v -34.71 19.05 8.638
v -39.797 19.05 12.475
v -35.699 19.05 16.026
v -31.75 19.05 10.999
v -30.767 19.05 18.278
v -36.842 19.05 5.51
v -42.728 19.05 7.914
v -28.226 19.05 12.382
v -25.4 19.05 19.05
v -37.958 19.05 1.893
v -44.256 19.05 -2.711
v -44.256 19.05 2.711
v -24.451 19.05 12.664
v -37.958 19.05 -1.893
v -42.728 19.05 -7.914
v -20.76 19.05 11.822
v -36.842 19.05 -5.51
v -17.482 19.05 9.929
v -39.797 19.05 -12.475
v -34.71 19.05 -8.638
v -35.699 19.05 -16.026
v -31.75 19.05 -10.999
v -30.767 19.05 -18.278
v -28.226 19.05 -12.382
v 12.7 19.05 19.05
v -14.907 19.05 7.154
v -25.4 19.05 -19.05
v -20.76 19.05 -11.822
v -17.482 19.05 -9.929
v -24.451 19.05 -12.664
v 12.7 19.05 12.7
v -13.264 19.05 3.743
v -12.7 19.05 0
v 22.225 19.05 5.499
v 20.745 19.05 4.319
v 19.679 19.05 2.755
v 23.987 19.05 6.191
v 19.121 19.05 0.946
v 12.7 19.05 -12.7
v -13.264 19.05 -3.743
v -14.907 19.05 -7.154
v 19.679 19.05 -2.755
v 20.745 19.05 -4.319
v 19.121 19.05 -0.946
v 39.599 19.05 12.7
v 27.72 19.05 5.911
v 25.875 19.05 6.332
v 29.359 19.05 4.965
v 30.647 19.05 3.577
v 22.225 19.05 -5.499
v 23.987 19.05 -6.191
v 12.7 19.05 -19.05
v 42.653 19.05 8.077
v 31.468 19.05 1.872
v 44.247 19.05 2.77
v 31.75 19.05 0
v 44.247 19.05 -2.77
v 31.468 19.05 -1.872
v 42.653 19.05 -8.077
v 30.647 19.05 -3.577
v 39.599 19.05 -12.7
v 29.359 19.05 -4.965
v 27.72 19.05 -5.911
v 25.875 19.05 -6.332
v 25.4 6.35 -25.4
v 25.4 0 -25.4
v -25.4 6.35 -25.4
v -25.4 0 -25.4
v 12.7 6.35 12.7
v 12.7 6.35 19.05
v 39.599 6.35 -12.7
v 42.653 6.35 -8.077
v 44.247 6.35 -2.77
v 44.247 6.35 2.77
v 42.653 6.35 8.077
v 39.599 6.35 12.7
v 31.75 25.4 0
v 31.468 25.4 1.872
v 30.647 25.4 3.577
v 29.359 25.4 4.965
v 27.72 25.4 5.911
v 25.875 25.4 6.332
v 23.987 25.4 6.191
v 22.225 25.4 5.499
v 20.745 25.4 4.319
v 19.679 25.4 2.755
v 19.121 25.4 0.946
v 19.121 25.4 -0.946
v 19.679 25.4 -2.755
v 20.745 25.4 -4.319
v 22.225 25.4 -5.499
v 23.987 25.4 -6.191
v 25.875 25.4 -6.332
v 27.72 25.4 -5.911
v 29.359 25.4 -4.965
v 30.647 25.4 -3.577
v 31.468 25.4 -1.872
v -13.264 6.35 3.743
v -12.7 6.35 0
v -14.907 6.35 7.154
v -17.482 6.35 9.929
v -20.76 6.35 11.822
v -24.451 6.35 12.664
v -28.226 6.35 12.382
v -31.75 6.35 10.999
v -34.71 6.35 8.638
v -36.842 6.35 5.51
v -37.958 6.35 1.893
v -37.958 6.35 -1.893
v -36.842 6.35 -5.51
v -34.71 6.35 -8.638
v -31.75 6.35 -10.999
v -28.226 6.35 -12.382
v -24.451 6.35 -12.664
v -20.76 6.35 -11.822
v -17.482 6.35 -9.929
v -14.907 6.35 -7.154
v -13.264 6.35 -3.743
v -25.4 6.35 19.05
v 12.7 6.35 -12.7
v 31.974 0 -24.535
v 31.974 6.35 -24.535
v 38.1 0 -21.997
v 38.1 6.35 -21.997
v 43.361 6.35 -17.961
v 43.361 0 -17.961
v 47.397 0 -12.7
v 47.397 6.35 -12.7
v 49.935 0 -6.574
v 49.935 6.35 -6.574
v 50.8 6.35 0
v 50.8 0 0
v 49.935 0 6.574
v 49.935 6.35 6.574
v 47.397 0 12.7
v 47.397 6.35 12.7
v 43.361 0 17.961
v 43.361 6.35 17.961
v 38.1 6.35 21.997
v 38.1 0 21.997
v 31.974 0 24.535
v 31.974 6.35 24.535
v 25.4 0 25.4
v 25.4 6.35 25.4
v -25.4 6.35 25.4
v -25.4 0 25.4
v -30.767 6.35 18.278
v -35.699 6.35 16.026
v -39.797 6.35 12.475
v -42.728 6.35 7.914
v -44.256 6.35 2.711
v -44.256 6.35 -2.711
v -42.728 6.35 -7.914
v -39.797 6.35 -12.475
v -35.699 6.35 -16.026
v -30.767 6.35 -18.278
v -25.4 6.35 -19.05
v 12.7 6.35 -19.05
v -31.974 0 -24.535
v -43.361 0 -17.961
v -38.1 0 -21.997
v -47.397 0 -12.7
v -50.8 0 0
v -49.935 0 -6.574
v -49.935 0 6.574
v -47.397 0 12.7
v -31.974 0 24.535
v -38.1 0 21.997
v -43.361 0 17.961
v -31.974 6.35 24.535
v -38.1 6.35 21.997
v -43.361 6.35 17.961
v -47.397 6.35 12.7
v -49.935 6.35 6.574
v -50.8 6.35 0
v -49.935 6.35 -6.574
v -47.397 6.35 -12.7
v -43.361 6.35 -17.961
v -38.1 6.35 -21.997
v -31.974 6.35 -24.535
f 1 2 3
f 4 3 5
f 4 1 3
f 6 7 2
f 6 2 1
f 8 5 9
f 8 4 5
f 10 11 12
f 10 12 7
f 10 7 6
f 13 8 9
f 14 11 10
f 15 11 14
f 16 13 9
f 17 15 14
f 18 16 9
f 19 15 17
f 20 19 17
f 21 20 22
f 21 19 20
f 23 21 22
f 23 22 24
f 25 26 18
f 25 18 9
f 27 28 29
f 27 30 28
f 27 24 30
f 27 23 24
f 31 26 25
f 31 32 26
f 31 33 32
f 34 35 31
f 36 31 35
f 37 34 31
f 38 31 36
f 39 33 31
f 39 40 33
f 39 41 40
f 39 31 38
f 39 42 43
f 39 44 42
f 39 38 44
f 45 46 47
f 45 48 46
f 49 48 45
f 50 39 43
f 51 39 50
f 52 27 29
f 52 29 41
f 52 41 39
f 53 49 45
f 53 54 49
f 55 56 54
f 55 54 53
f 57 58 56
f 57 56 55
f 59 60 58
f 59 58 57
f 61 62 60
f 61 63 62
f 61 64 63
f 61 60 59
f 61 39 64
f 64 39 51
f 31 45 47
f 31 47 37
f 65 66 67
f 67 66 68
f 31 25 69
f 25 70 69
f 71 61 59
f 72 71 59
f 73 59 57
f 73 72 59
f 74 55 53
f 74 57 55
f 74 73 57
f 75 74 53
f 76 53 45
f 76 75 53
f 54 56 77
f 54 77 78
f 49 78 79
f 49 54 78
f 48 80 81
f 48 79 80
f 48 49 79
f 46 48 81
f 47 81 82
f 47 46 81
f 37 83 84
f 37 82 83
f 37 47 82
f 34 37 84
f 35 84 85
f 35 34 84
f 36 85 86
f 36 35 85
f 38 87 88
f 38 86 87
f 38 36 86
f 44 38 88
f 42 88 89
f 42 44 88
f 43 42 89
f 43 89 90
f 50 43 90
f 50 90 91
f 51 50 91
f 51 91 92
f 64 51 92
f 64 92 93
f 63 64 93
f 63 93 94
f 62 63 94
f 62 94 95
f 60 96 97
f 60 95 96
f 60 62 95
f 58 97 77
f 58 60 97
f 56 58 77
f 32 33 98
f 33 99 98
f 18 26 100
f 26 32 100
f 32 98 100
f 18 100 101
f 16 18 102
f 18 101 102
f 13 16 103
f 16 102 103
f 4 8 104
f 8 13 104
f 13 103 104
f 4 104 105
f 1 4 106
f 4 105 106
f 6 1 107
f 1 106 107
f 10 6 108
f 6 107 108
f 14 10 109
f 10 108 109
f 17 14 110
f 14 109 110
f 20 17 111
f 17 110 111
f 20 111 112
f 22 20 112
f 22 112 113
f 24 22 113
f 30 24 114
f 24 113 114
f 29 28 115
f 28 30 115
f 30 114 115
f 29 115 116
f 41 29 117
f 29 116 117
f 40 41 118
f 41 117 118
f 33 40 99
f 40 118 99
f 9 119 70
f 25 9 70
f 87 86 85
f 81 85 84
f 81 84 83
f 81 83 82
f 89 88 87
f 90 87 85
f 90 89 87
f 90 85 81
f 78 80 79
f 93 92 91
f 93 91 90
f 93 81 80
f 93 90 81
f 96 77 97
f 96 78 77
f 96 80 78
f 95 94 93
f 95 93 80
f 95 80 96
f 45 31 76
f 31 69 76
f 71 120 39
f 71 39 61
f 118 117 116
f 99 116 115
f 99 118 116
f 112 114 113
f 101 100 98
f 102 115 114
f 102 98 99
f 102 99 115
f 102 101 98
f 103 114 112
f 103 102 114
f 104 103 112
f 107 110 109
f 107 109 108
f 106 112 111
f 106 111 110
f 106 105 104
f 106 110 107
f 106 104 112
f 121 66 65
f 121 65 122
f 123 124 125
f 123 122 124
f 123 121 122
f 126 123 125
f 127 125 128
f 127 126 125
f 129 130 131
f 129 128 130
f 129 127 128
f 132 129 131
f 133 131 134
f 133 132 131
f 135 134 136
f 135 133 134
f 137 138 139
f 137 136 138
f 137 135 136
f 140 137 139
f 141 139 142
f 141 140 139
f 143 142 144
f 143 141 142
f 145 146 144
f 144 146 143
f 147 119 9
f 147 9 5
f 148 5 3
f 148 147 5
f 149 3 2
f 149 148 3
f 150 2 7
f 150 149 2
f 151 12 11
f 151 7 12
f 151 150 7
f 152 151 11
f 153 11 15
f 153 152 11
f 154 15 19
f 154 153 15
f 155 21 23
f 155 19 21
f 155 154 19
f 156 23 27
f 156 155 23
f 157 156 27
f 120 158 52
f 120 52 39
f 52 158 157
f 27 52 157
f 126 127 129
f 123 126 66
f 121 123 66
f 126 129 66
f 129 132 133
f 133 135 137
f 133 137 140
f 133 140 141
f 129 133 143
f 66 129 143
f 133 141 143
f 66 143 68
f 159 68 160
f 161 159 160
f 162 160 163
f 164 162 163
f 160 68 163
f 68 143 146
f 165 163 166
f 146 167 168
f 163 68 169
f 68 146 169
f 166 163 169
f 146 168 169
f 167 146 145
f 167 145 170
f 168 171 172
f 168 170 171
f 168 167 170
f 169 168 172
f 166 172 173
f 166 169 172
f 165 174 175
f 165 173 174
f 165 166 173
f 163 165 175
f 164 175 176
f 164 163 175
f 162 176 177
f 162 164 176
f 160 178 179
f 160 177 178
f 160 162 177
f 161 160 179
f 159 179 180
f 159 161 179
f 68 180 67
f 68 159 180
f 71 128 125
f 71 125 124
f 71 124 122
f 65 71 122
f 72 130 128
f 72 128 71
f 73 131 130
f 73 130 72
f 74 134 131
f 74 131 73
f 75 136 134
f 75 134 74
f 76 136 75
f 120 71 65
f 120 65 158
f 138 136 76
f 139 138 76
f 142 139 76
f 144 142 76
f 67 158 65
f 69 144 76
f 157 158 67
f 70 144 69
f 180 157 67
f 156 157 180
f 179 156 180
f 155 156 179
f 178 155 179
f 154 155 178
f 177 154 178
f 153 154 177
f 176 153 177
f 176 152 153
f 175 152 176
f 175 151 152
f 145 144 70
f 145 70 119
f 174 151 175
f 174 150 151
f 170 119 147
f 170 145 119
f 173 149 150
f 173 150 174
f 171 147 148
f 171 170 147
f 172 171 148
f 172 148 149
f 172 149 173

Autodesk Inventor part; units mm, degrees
ref_plane "YZ Plane" through (0, 0, 0) normal (1, 0, 0) x (0, 1, 0)
ref_plane "XZ Plane" through (0, 0, 0) normal (0, 1, 0) x (-1, 0, 0)
ref_plane "XY Plane" through (0, 0, 0) normal (0, 0, 1) x (1, 0, 0)
sketch "Sketch1" plane through (0, 0, 0) normal (0, 1, 0) x (-1, 0, 0)
  line L0 (25.4, 0) -> (-25.4, 0) construction
  line L1 (25.4, 25.4) -> (-25.4, 25.4)
  line L2 (-25.4, -25.4) -> (25.4, -25.4)
  arc A0 (25.4, -25.4) -> (25.4, 25.4) centre (25.4, 0) ccw
  arc A1 (-25.4, 25.4) -> (-25.4, -25.4) centre (-25.4, 0) ccw
  point P0 (0, 0)
  dimension "d0" = 50.8
  dimension "d1" = 25.4
extrude "Extrusion1" add sketch "Sketch1" along normal blind 6.35
sketch "Sketch2" plane through (0, 6.35, 0) normal (0, 1, 0) x (1, 0, 0)
  line L0 (25.4, 0) -> (-25.4, 0) construction
  line L1 (25.4, 19.05) -> (-25.4, 19.05)
  line L2 (-25.4, -19.05) -> (25.4, -19.05)
  arc A0 (25.4, -19.05) -> (25.4, 19.05) centre (25.4, 0) ccw
  arc A1 (-25.4, 19.05) -> (-25.4, -19.05) centre (-25.4, 0) ccw
  line L3 (25.4, 25.4) -> (-25.4, 25.4) projected
  line L4 (12.7, -19.05) -> (12.7, -12.7)
  line L5 (12.7, -12.7) -> (39.599, -12.7)
  line L6 (12.7, 19.05) -> (12.7, 12.7)
  line L7 (12.7, 12.7) -> (39.599, 12.7)
  circle A2 centre (-25.4, 0) radius 12.7
  point P0 (0, 0)
  point P1 (0, 0)
  point P2 (12.7, -15.875)
  point P3 (39.599, 12.7)
  dimension "d4" = 19.05
  dimension "d5" = 38.1
  dimension "d6" = 25.4
  dimension "d7" = 25.4
extrude "Extrusion2" add sketch "Sketch2" along normal blind 12.7 contours L6 L7 A0 L5 L4 L2 A1 L1
sketch "Sketch3" plane through (0, 19.05, 0) normal (0, 1, 0) x (1, 0, 0)
  arc A0 (25.4, -25.4) -> (25.4, 25.4) centre (25.4, 0) ccw projected
  circle A1 centre (25.4, 0) radius 6.35
  point P0 (0, 0)
  dimension "d10" = 12.7
extrude "Extrusion3" add sketch "Sketch3" along normal blind 6.35
properties part number "PivotLock"
